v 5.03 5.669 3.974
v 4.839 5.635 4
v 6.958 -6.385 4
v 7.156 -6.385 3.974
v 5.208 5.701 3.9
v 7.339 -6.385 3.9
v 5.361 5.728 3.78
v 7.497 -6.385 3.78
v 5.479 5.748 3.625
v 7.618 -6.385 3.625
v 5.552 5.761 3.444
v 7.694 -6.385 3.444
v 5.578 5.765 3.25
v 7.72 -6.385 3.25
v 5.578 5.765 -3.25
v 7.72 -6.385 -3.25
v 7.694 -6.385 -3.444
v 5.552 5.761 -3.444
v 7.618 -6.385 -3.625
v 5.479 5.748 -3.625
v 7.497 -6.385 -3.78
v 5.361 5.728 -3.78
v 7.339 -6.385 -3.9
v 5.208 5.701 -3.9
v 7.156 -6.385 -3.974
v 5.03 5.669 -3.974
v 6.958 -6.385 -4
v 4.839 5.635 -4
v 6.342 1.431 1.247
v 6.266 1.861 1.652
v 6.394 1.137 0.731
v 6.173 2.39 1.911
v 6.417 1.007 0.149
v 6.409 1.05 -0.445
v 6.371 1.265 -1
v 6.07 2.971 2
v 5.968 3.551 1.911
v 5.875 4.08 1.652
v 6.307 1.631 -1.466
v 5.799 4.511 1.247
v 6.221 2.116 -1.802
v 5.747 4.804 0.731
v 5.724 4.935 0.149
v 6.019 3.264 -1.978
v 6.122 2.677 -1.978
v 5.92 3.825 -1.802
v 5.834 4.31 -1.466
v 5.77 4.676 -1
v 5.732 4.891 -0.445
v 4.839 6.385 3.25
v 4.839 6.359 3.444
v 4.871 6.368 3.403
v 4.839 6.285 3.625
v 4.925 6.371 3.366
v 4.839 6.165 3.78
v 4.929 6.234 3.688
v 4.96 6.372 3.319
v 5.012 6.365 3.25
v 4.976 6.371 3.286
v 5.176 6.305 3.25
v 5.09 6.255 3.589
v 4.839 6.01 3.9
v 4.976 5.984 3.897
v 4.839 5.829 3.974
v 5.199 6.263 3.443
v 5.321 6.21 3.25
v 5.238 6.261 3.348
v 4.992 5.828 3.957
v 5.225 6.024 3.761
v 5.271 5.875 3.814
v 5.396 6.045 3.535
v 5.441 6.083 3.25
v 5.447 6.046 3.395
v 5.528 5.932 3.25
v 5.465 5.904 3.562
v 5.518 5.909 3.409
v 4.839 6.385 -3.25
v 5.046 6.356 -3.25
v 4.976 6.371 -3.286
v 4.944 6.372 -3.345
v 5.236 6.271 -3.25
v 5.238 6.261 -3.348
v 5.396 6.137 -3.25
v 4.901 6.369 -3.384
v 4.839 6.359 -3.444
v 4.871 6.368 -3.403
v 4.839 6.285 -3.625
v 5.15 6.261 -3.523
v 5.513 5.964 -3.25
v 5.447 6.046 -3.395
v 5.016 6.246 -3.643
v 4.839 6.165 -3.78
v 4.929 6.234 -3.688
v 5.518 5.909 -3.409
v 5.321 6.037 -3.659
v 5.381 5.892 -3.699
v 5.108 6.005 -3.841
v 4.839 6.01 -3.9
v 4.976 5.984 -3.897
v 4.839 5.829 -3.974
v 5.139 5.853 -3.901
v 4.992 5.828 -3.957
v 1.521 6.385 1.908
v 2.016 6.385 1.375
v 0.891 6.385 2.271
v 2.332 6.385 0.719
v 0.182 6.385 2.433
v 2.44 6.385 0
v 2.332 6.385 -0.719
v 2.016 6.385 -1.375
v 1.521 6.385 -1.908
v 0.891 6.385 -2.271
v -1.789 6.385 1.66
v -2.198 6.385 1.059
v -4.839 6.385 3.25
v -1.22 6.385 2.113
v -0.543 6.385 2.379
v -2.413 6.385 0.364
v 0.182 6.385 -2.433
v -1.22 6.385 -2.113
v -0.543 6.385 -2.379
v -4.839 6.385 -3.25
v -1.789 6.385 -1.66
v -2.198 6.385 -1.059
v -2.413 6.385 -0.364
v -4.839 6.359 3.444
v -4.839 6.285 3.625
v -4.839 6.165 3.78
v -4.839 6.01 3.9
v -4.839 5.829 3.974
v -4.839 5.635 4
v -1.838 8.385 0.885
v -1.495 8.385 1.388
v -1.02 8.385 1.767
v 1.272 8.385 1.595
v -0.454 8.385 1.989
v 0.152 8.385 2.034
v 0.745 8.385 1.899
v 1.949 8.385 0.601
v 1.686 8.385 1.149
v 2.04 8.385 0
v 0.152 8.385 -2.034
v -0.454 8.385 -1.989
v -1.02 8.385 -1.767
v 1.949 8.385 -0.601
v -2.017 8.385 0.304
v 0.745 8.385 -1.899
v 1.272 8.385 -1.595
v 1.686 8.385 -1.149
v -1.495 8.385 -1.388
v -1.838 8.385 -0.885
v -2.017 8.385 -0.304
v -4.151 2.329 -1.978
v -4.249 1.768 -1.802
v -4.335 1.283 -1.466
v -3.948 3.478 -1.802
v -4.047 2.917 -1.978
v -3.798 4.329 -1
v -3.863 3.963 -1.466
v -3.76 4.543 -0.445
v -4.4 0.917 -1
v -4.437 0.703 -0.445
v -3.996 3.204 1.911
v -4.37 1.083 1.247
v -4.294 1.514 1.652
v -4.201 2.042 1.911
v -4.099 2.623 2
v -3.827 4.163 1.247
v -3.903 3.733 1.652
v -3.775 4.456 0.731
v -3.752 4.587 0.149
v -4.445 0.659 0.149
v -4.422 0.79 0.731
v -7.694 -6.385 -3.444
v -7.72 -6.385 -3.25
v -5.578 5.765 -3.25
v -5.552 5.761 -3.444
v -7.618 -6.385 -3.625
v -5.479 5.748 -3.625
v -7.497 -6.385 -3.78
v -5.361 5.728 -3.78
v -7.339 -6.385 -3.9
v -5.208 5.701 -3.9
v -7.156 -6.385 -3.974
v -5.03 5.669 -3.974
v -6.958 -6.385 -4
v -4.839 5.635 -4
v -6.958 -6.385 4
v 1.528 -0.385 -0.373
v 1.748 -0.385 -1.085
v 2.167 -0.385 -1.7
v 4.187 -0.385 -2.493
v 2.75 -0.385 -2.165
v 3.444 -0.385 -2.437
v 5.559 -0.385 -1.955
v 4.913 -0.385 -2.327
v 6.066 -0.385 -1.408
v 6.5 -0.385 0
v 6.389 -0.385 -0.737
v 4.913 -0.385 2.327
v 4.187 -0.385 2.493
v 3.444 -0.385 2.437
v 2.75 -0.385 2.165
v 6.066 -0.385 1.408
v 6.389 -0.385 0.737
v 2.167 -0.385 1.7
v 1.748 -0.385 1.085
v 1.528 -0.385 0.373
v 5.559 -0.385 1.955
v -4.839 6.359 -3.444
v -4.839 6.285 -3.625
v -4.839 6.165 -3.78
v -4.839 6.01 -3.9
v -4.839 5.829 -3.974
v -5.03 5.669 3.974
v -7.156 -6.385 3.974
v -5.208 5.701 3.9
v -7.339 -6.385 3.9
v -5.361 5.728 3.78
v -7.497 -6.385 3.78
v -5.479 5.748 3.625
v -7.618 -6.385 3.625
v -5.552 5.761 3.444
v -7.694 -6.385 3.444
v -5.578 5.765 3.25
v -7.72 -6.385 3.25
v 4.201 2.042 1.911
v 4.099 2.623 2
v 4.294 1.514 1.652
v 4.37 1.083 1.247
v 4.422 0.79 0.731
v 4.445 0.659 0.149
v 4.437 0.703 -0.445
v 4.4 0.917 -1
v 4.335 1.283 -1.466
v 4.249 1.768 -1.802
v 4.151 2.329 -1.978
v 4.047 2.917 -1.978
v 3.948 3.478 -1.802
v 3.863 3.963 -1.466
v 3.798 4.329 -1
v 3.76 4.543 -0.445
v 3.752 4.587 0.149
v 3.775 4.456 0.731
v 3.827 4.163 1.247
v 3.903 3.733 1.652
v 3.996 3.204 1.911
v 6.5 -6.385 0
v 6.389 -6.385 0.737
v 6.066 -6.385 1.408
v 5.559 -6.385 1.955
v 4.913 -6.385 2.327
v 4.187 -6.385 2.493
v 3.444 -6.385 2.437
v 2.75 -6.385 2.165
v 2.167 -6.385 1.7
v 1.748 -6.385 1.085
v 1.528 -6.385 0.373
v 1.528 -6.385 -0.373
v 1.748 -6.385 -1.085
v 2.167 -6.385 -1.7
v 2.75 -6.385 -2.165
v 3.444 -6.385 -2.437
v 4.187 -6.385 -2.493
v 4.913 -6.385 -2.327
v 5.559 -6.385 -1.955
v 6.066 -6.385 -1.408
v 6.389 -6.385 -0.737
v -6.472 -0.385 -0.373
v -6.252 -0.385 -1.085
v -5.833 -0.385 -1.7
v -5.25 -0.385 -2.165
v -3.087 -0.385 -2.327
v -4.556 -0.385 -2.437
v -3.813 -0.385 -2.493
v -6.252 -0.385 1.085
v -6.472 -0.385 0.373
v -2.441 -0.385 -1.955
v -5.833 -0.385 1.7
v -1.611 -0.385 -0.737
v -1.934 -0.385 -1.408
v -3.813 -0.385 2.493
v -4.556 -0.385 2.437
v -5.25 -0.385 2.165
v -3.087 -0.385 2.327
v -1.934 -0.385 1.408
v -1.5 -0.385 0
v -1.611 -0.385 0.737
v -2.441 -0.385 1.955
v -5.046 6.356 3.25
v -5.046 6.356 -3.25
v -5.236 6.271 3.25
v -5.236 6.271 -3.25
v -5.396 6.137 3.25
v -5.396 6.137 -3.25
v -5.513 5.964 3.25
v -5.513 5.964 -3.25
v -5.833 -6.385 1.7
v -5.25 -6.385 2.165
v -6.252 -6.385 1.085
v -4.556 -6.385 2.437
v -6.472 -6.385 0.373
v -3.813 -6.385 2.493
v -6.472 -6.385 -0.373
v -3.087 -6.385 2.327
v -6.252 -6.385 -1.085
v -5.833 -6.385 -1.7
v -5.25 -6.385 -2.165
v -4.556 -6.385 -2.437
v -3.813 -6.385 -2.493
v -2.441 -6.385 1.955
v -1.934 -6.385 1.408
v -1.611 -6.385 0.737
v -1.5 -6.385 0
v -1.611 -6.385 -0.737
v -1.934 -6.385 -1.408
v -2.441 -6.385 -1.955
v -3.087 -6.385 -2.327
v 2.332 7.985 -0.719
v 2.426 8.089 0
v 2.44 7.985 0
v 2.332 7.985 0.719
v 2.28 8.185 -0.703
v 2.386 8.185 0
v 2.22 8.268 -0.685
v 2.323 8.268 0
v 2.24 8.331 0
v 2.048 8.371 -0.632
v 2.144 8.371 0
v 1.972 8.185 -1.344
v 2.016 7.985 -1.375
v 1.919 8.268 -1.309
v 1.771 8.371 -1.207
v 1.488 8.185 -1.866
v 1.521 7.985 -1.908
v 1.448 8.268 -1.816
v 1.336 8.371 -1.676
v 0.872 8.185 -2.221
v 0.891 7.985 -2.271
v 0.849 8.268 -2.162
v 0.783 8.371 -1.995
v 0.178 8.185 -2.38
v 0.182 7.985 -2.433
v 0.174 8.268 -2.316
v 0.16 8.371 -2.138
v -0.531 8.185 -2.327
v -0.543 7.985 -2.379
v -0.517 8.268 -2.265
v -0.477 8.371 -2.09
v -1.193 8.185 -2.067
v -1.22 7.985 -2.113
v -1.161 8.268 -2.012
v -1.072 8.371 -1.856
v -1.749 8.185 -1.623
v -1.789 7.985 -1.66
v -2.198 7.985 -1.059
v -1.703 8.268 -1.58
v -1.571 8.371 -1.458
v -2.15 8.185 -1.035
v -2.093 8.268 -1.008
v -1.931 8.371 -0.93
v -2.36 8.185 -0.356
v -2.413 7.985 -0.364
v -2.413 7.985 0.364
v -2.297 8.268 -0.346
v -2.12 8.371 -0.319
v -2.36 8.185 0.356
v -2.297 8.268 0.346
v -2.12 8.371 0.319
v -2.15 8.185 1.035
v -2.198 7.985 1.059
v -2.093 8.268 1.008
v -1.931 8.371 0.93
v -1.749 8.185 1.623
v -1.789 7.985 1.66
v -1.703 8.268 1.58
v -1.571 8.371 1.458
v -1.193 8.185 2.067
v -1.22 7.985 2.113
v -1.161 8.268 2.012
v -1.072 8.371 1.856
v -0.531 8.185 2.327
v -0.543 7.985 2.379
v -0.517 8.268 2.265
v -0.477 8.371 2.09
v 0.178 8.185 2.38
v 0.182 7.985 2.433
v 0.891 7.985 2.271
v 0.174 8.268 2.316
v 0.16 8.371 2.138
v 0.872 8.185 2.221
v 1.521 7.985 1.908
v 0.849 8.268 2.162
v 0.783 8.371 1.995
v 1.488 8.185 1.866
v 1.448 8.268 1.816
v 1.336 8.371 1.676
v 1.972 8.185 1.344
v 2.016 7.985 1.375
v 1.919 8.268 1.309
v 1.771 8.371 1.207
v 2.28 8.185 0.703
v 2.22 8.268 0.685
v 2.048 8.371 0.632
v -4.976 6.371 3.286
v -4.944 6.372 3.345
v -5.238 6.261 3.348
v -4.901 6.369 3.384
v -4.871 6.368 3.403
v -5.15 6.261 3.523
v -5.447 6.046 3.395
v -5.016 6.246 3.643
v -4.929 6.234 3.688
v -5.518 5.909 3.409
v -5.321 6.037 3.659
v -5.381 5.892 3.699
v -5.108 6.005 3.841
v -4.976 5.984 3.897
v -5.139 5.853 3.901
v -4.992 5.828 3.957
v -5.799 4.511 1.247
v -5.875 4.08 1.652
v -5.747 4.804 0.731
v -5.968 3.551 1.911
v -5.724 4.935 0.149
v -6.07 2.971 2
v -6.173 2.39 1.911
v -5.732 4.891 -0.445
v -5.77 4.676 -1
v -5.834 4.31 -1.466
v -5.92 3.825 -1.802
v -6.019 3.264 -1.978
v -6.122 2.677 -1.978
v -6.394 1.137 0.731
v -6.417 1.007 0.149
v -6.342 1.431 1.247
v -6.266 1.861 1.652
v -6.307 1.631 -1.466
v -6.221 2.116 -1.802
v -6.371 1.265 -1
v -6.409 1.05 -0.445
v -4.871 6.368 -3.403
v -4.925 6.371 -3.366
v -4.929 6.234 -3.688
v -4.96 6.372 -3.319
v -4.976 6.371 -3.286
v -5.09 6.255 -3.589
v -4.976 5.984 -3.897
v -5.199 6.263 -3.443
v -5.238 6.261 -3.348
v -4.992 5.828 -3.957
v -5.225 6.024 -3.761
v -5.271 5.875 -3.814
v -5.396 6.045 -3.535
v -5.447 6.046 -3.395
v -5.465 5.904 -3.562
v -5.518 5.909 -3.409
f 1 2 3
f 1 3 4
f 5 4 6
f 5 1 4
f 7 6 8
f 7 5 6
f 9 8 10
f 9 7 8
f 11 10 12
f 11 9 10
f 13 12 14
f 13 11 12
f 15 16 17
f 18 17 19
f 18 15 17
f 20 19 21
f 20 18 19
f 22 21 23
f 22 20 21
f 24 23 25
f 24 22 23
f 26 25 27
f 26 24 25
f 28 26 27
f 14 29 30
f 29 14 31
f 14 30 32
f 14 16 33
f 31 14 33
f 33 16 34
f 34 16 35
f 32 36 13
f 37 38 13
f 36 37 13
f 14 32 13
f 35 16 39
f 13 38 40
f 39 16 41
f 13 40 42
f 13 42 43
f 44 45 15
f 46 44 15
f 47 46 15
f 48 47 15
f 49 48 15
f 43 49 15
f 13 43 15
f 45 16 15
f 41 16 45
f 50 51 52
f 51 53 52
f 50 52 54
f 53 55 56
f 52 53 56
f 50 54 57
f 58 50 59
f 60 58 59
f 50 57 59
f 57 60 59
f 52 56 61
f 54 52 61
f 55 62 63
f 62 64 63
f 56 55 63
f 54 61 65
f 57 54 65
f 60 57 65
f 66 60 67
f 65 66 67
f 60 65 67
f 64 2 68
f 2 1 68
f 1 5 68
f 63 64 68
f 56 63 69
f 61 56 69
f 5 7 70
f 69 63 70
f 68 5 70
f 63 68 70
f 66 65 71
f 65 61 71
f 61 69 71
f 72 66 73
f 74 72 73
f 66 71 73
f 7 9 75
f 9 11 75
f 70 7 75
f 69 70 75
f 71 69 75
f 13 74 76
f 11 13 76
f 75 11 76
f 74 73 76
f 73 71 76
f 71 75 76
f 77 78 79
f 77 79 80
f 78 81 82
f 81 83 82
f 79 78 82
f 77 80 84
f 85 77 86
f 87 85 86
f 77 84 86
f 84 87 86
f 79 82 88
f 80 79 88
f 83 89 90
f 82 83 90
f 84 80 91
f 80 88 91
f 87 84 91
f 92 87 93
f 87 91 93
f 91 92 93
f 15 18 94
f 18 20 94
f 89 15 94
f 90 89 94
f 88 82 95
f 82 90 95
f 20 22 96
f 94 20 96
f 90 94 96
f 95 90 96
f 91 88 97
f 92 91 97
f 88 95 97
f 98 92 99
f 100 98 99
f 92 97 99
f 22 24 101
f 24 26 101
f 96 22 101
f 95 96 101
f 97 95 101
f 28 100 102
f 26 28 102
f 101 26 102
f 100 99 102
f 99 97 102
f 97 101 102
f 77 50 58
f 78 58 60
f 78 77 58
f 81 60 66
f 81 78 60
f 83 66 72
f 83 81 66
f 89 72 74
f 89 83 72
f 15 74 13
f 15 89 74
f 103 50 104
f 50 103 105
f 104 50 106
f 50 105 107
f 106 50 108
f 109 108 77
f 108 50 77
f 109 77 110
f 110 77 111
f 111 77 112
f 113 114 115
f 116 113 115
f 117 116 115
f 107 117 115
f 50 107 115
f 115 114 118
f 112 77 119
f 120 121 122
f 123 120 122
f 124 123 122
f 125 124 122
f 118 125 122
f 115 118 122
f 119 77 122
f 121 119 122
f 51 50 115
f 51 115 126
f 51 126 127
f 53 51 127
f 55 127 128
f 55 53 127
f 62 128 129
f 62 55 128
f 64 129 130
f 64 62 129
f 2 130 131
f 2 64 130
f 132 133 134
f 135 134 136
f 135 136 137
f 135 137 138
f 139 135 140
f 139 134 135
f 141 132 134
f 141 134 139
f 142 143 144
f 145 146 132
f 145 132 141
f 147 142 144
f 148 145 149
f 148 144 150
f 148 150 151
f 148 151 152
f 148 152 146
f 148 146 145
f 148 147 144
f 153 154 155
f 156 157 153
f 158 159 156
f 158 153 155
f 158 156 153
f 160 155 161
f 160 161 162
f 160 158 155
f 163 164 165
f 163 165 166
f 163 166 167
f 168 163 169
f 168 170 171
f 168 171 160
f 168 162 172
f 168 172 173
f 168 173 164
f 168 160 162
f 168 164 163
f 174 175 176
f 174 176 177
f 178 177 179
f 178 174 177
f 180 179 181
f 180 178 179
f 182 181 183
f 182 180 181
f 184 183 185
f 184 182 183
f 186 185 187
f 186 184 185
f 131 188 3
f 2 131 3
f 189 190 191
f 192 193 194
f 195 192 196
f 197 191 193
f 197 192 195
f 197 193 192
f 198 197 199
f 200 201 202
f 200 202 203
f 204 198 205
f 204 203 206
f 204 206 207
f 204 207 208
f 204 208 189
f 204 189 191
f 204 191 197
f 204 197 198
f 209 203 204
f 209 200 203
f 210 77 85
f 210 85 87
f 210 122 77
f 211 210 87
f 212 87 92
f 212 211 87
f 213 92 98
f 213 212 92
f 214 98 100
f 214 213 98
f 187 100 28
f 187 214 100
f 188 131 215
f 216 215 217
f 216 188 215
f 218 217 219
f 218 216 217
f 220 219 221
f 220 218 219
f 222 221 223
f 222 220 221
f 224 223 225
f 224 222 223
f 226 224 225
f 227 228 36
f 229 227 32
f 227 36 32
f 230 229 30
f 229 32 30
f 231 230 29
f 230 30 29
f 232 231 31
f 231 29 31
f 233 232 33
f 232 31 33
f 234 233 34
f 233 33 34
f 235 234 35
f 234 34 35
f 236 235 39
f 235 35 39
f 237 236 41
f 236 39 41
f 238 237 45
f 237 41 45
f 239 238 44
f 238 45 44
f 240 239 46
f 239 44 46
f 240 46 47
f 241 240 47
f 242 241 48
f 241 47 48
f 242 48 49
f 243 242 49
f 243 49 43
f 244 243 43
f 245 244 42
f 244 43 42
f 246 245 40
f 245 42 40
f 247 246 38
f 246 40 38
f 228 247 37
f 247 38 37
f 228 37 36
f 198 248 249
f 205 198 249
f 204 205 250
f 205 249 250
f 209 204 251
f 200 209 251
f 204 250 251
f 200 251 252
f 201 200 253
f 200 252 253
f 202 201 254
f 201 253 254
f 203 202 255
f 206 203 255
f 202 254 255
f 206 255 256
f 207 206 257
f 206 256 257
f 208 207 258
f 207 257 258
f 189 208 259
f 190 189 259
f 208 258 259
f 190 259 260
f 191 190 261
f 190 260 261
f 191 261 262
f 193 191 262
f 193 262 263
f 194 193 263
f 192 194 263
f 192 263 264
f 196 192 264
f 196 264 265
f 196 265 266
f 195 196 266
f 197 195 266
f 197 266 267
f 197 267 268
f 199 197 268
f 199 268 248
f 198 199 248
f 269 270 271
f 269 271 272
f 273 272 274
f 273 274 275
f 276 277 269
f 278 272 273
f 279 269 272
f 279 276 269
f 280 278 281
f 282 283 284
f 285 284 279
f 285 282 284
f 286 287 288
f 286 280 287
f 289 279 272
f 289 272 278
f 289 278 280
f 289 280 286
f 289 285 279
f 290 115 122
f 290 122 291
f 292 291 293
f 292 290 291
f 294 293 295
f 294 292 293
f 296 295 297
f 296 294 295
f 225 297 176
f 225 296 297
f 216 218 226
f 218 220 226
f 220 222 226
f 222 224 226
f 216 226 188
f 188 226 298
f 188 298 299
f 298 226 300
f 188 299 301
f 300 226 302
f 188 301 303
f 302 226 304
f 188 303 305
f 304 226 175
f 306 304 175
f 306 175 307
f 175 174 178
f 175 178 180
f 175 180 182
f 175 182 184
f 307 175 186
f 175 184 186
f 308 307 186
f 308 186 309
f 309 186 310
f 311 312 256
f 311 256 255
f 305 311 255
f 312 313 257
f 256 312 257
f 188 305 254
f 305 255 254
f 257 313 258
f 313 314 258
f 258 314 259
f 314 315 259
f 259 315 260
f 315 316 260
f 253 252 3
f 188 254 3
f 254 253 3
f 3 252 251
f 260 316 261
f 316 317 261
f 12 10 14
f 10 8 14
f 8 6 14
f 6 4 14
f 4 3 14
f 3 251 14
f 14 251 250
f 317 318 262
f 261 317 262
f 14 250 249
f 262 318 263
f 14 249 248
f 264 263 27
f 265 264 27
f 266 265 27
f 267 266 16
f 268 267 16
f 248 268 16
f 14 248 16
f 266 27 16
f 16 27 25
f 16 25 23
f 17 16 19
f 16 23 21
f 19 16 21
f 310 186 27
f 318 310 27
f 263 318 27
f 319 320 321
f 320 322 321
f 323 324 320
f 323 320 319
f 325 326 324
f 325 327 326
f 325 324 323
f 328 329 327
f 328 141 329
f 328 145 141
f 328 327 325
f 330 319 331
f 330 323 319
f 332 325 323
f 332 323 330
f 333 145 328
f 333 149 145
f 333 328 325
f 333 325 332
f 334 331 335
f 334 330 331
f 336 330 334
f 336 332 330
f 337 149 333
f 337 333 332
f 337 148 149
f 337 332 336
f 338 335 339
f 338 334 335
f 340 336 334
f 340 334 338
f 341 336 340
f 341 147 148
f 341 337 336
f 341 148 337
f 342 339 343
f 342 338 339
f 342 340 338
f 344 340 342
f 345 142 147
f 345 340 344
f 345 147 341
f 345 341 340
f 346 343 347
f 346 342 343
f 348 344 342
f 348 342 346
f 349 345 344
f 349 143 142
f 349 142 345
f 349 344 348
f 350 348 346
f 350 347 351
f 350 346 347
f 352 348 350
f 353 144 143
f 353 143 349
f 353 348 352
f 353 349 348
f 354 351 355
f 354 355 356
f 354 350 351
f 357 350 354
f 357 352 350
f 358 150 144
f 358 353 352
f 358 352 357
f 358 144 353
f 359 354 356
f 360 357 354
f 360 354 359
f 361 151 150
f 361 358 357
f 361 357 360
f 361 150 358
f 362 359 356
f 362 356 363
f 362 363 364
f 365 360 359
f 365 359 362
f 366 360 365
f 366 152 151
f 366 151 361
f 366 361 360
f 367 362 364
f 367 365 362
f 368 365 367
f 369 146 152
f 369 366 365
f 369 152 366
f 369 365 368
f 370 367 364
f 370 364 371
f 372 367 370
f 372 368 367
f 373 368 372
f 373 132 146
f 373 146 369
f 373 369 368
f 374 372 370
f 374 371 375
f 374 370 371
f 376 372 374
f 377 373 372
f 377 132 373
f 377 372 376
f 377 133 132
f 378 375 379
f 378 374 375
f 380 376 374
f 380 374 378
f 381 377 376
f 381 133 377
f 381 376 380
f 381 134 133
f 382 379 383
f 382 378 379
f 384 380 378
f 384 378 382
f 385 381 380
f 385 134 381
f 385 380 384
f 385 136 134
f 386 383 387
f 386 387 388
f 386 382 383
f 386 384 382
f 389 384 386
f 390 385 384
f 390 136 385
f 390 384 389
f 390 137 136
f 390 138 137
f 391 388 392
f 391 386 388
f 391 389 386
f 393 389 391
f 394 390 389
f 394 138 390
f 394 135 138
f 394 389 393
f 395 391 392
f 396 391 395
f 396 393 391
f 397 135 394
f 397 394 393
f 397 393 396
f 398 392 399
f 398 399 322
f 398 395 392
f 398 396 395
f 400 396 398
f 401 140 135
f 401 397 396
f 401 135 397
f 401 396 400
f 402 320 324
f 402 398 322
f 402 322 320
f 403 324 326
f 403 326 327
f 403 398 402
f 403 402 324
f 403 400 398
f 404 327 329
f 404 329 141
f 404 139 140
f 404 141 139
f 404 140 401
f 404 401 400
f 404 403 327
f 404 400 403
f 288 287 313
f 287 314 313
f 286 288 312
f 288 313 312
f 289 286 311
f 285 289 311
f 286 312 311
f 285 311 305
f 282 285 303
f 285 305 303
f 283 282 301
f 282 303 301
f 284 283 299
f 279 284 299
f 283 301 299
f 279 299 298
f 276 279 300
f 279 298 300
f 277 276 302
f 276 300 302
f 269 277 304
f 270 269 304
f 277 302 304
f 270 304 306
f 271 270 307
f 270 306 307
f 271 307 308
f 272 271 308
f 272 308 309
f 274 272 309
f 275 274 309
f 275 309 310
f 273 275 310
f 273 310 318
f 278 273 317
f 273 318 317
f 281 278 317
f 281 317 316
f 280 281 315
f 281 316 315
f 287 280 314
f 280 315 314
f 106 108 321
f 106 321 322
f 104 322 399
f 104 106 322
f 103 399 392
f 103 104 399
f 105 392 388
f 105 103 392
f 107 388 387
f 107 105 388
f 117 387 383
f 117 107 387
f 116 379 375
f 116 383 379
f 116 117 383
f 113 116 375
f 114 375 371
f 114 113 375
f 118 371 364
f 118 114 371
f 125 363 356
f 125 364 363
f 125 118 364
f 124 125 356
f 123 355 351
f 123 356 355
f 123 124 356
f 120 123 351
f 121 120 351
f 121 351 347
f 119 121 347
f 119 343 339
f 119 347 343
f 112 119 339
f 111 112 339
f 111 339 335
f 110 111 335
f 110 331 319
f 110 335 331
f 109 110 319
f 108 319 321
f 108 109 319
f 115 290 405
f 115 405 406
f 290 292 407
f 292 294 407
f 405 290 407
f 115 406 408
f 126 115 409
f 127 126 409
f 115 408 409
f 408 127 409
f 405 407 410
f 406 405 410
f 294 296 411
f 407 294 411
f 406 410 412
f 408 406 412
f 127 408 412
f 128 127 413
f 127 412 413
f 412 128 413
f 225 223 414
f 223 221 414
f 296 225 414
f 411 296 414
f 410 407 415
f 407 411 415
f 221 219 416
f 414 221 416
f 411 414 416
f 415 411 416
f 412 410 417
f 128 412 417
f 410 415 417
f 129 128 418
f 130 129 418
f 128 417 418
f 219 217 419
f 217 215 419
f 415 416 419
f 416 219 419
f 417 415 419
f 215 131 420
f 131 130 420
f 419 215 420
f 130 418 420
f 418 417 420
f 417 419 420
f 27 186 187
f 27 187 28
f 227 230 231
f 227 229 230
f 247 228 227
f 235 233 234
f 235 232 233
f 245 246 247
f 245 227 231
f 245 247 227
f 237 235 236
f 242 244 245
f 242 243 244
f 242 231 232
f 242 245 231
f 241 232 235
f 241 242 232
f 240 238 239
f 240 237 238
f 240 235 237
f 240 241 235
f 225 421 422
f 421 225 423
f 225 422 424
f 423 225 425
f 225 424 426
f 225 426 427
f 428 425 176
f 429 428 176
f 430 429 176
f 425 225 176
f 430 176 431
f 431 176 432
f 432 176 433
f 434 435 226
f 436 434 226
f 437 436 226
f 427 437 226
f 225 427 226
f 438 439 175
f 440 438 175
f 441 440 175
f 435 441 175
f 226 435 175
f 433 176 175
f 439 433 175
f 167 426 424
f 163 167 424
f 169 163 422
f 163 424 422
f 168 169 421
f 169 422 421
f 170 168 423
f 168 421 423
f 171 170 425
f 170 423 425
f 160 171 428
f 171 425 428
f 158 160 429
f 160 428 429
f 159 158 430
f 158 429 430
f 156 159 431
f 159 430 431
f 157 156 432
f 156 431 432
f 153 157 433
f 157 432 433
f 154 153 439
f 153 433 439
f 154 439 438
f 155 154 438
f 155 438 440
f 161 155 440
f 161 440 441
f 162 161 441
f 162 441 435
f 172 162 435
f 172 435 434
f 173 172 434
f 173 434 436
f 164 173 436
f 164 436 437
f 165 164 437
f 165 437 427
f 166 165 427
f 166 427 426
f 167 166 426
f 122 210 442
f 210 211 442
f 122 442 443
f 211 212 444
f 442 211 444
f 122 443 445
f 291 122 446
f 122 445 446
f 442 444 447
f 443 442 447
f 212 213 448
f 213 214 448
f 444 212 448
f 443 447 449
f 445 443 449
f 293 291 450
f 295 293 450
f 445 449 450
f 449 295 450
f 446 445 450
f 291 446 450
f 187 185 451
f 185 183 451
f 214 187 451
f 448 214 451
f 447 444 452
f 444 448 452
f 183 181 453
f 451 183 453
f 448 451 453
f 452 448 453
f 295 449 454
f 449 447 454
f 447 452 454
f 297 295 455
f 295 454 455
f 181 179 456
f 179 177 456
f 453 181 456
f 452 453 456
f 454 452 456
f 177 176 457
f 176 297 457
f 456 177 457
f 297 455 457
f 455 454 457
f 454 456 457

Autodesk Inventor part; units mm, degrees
ref_plane "YZ Plane" through (0, 0, 0) normal (1, 0, 0) x (0, 1, 0)
ref_plane "XZ Plane" through (0, 0, 0) normal (0, 1, 0) x (-1, 0, 0)
ref_plane "XY Plane" through (0, 0, 0) normal (0, 0, 1) x (1, 0, 0)
sketch "Sketch1" plane through (0, 0, 0) normal (0, 0, 1) x (1, 0, 0)
  line L0 (-7.72, -6.385) -> (7.72, -6.385)
  line L1 (7.72, -6.385) -> (5.4683, 6.385)
  line L2 (5.4683, 6.385) -> (-5.4683, 6.385)
  line L3 (-5.4683, 6.385) -> (-7.72, -6.385)
  point P0 (0, 0)
  point P1 (0, -6.385)
  point P2 (-6.5942, 0)
  dimension "d0" = 15.44
  dimension "d1" = 80
  dimension "d2" = 12.77
extrude "Extrusion1" add sketch "Sketch1" along normal mid plane 8
sketch "Sketch2" plane through (-7.72, -6.385, 4) normal (0, -1, 0) x (1, 0, 0)
  line L0 (15.44, -8) -> (15.44, 0) projected
  line L1 (3.72, -4) -> (11.72, -4) construction
  circle A0 centre (3.72, -4) radius 2.5
  circle A1 centre (11.72, -4) radius 2.5
  point P0 (7.72, -4)
  point P1 (7.72, -4)
  dimension "d5" = 5
  dimension "d6" = 8
extrude "Extrusion2" cut sketch "Sketch2" against normal blind 6
sketch "Sketch3" plane through (-5.4683, 6.385, 4) normal (0, 1, 0) x (1, 0, 0)
  circle A0 centre (5.4683, 4) radius 2.44
  dimension "d9" = 4.88
extrude "Extrusion3" add sketch "Sketch3" along normal blind 2
fillet "Fillet1" radius 0.4 1 edges at (-2.44, 8.385, 0)
fillet "Fillet2" radius 0.75 4 edges at (-6.5942, 0, 4) (-6.5942, 0, -4) (6.5942, 0, -4) (6.5942, 0, 4)
fillet "Fillet3" radius 0.75 8 edges at (-5.2452, 6.385, -3.7803) (-5.4683, 6.385, 0) (-5.2452, 6.385, 3.7803) (0, 6.385, 4) (5.2452, 6.385, 3.7803) (5.4683, 6.385, 0) (5.2452, 6.385, -3.7803) (0, 6.385, -4)
sketch "Sketch4" plane through (-7.72, -6.385, -3.25) normal (-0.9848, 0.1736, 0) x (0, 0, 1)
  line L0 (6.5, 0) -> (0, 0) projected
  circle A0 centre (3.25, 9.5) radius 2
  point P0 (3.25, 7.6286)
  dimension "d15" = 4
  dimension "d16" = 9.5
extrude "Extrusion4" cut sketch "Sketch4" against normal blind 2
mirror "Mirror1" about plane through (0, 0, 0) normal (1, 0, 0) of "Extrusion4"
properties part number "TORSO" material "250"
